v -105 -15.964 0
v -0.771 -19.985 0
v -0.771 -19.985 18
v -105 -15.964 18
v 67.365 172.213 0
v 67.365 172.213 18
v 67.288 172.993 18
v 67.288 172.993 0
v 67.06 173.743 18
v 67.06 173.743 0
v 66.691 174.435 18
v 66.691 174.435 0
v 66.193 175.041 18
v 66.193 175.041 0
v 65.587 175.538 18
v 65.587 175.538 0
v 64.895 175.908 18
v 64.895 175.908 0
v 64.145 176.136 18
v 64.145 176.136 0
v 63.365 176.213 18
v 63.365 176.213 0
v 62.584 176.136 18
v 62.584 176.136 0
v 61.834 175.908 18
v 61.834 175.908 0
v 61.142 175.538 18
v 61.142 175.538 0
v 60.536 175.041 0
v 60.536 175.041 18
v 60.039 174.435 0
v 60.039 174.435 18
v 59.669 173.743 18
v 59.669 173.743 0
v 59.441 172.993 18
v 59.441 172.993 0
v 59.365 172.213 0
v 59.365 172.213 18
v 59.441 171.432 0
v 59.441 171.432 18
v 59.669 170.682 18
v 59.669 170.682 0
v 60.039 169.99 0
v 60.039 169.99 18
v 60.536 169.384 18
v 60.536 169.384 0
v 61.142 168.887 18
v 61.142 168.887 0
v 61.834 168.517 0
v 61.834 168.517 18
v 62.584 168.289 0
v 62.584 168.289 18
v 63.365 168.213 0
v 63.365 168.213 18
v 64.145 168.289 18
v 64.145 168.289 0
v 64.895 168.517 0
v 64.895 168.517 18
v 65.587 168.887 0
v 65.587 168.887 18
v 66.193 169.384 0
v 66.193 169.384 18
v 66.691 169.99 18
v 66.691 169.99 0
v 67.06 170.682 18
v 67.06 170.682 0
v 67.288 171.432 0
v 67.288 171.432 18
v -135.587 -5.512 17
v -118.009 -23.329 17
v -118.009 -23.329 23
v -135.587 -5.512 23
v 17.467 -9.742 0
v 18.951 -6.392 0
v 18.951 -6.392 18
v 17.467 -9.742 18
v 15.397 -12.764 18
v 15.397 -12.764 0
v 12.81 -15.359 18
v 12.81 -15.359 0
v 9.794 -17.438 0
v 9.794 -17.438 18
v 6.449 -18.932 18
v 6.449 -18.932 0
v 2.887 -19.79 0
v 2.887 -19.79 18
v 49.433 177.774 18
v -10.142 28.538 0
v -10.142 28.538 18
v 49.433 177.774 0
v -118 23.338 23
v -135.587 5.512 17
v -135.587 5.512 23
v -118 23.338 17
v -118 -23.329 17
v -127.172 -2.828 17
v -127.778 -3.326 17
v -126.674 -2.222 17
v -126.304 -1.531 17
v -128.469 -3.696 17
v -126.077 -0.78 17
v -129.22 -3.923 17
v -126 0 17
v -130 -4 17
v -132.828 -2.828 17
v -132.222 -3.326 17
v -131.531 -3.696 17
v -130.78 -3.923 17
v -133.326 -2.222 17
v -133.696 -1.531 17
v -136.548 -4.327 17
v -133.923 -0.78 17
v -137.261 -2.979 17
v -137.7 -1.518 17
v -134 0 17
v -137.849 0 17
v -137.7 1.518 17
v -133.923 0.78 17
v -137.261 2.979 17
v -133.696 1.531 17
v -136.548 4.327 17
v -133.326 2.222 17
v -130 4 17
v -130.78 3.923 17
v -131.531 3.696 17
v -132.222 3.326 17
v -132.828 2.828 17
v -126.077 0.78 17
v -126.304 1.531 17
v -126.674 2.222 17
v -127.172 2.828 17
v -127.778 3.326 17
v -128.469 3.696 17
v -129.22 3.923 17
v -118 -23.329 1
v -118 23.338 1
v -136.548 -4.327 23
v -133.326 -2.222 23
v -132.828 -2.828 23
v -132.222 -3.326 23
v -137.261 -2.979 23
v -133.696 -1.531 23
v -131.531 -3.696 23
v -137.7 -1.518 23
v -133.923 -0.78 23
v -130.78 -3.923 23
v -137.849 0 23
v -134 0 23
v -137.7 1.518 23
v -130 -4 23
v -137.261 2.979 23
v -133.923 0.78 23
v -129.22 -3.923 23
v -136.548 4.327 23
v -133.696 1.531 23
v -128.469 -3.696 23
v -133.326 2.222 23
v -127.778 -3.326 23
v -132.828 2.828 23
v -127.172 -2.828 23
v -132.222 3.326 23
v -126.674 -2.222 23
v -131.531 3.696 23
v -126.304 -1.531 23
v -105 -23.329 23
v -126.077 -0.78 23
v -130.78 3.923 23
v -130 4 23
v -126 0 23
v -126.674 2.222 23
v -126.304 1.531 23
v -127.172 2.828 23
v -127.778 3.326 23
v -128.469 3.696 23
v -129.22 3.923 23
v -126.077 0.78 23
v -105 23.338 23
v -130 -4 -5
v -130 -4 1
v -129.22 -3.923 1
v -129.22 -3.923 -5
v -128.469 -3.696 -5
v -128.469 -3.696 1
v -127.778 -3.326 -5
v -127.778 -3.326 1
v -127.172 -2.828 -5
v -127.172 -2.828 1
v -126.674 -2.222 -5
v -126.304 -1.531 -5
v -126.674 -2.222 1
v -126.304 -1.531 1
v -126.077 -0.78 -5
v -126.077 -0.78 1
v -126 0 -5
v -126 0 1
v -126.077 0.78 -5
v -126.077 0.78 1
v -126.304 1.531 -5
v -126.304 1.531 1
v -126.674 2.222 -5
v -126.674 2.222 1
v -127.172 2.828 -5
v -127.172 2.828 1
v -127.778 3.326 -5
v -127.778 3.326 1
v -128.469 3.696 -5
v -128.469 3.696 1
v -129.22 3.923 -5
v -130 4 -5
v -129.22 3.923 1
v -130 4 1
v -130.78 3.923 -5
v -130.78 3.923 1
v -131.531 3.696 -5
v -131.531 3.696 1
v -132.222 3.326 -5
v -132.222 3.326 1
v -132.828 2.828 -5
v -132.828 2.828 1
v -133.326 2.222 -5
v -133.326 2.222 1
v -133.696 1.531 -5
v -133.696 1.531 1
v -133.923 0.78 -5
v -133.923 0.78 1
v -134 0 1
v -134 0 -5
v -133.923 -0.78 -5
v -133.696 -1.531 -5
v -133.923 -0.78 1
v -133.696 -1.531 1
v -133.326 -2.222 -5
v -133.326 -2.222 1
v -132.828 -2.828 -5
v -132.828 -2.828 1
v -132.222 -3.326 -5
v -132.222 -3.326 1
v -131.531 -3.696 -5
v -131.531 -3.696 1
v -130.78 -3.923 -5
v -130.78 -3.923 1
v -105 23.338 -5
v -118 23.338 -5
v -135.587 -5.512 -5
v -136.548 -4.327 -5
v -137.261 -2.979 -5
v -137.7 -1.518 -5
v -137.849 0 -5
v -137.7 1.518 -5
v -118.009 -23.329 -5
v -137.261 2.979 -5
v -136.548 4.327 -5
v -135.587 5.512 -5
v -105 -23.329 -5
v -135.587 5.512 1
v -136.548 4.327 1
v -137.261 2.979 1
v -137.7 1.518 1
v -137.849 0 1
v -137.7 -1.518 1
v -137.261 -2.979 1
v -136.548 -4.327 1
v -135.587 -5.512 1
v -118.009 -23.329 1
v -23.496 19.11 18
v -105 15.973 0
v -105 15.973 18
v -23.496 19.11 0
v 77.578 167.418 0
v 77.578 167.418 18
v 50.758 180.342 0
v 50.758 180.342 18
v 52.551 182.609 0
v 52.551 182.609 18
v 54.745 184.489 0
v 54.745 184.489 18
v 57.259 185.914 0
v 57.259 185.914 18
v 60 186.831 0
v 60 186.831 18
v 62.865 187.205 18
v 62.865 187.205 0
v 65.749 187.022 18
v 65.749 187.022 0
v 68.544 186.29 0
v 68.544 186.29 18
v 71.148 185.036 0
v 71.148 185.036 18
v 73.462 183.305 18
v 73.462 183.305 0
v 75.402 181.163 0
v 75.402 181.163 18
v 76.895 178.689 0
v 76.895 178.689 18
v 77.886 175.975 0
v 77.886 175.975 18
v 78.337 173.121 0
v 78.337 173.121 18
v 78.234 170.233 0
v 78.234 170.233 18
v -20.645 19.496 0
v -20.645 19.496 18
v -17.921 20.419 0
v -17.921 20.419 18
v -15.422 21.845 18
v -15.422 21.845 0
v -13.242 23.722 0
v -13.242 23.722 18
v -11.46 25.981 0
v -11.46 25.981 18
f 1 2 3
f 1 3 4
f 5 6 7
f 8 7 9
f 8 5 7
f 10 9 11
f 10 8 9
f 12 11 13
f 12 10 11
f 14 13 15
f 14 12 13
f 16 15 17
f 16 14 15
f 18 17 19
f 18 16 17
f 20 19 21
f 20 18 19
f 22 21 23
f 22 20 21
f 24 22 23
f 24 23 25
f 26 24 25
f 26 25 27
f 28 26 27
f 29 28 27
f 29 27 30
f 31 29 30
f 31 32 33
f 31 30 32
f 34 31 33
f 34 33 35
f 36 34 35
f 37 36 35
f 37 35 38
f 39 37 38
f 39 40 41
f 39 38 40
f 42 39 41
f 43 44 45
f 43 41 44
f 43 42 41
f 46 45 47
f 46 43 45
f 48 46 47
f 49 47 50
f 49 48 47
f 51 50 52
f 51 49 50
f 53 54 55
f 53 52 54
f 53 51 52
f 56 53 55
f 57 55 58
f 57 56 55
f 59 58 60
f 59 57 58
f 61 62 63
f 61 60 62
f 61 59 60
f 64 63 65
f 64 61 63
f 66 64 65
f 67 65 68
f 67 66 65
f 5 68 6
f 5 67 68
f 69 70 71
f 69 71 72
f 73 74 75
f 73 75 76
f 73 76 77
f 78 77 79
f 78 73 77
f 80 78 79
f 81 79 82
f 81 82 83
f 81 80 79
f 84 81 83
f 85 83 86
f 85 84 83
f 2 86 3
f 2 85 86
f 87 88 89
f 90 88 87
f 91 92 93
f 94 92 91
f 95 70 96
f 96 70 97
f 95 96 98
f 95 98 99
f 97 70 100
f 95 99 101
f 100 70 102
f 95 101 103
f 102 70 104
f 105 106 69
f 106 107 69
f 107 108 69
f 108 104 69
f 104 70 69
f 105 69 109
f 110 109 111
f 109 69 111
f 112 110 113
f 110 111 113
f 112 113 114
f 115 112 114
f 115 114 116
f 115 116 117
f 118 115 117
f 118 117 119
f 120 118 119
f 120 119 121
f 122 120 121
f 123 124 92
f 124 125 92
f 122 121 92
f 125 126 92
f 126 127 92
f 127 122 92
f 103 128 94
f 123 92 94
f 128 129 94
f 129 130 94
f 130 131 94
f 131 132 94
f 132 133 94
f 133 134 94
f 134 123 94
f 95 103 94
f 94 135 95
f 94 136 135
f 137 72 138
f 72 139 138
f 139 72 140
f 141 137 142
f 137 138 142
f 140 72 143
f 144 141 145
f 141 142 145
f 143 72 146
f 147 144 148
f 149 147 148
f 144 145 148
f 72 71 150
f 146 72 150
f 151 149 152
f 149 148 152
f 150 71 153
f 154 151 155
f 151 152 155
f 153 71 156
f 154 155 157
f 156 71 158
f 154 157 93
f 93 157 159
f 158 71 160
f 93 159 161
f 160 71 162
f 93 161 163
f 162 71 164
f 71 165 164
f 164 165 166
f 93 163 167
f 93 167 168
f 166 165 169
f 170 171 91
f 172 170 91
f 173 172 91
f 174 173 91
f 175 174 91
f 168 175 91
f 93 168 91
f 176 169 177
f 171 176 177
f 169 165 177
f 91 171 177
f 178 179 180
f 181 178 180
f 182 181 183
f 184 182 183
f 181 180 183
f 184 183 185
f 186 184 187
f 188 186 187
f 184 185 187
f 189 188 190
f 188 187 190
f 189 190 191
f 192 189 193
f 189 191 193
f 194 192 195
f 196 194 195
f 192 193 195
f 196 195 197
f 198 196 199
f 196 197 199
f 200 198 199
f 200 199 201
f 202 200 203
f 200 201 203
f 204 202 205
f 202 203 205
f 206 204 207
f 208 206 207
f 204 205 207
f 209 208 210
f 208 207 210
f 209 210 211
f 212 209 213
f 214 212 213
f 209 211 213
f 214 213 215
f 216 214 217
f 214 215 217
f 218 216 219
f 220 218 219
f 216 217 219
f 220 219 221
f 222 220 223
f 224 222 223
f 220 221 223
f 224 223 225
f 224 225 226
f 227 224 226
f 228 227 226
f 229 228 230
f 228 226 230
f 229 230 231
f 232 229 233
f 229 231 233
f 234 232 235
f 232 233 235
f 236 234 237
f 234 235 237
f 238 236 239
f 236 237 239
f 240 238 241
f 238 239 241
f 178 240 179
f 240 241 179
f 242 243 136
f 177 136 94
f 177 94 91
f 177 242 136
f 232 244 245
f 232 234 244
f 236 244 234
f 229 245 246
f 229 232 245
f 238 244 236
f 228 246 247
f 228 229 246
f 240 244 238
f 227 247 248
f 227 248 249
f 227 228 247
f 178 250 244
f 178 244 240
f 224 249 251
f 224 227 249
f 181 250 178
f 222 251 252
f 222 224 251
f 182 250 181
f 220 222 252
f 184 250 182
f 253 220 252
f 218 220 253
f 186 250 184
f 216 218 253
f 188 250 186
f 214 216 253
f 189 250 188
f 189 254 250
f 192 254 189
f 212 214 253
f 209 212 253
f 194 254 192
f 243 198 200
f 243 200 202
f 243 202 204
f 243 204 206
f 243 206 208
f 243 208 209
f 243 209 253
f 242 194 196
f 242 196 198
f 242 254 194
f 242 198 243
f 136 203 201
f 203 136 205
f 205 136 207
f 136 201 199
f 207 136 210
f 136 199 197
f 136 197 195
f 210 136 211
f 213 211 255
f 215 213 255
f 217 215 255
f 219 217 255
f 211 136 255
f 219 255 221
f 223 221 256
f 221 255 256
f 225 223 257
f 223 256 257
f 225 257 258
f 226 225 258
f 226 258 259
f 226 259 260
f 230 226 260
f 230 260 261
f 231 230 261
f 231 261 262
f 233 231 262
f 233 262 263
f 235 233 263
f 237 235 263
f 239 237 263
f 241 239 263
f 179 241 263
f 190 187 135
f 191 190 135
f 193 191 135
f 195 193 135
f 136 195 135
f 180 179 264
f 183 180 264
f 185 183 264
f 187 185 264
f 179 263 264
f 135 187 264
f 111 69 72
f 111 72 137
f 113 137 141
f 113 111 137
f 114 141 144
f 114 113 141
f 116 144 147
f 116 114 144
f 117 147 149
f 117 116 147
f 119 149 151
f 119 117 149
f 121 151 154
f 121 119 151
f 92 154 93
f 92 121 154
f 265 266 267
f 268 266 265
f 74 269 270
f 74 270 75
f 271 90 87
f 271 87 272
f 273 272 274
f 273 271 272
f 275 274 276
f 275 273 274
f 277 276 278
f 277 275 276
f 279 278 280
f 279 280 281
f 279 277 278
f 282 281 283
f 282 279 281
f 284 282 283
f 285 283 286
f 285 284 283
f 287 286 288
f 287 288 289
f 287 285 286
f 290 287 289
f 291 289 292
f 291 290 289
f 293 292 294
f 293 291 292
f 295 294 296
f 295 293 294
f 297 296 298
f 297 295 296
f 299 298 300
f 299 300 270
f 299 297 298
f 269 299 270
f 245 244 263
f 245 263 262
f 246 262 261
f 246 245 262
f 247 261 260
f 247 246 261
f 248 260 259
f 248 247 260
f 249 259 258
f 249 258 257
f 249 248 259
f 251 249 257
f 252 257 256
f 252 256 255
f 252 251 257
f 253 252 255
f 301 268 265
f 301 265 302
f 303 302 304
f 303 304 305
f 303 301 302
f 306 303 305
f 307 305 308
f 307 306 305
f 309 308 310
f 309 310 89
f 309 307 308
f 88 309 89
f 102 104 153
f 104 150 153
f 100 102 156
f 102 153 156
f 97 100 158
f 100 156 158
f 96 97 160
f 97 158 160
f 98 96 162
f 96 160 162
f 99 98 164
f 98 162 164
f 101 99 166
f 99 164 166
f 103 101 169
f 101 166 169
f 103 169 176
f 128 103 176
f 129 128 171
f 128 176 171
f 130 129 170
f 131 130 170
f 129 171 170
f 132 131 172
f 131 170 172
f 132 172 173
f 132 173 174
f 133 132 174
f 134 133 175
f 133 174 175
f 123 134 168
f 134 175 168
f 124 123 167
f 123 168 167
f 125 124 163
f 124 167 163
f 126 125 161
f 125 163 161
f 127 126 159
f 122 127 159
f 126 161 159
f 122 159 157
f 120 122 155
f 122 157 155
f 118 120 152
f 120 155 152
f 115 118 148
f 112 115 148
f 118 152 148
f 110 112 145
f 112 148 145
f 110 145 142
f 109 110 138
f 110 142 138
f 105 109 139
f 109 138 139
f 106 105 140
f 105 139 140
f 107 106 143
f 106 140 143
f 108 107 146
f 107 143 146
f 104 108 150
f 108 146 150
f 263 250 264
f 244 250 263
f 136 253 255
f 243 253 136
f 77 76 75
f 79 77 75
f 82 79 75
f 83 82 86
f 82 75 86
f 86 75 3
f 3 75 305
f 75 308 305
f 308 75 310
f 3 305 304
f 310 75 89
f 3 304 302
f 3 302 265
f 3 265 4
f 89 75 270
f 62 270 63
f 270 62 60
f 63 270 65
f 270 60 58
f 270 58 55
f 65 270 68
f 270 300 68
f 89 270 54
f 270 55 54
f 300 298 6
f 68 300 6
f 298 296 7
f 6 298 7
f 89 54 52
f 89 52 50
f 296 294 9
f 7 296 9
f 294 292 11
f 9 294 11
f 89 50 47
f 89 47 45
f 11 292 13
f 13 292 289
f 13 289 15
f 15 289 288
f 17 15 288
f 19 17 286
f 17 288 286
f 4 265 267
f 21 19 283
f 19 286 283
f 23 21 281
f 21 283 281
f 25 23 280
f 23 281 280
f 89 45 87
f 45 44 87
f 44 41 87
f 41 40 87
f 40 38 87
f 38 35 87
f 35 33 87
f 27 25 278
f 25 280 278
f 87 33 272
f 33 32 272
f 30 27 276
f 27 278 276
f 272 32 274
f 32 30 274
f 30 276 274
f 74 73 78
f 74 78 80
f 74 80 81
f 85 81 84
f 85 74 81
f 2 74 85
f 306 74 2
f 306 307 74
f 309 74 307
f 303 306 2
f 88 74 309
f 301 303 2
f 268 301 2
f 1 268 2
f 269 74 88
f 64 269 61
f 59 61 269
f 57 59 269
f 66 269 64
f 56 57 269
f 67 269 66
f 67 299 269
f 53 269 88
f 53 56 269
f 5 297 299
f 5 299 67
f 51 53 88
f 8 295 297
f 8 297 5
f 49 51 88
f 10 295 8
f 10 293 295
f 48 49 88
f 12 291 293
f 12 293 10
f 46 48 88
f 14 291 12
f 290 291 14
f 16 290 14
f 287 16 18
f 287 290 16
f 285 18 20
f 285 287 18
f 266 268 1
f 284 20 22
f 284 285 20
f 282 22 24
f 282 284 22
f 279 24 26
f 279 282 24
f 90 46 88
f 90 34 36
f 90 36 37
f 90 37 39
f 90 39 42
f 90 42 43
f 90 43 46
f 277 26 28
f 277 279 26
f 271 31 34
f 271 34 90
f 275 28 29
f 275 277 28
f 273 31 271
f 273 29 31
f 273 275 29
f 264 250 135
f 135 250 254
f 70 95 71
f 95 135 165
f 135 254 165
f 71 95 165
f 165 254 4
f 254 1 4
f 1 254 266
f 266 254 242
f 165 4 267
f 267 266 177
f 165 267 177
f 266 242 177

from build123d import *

# Parameters (mm, degrees)
EXTRUDE_1_DEPTH      = 18
SKETCH_10_W          = 36.784417634
SKETCH_10_H          = 49.551694486
CUT_EXTRUDE_7_DEPTH  = 25
SKETCH_11_W          = 28
SKETCH_11_H          = 46.666666667
EXTRUDE_2_DEPTH      = 35
SKETCH_2_R           = 4
CUT_EXTRUDE_9_DEPTH  = 40
CUT_EXTRUDE_10_DEPTH = 22
CUT_EXTRUDE_11_DEPTH = 28


with BuildPart() as part:
    # 草图1 → 凸台-拉伸1 (new body)
    with BuildSketch(Plane.XY):
        with BuildLine():
            Line((-130.576922015, 14.988928879), (-23.496301019, 19.11044112))
            ThreePointArc((-23.496301019, 19.11044112), (-15.422230188, 21.845348847), (-10.142250191, 28.538042722))
            Line((-10.142250191, 28.538042722), (49.433348919, 177.774006572))
            ThreePointArc((49.433348919, 177.774006572), (68.544423032, 186.290222442), (77.578179631, 167.418276909))
            Line((77.578179631, 167.418276909), (18.950963208, -6.392260437))
            ThreePointArc((18.950963208, -6.392260437), (11.349883724, -16.46754807), (-0.770941638, -19.985135701))
            Line((-0.770941638, -19.985135701), (-130.000001063, -15.000027558))
            ThreePointArc((-130.000001063, -15.000027558), (-144.997253695, -0.28851385), (-130.576922015, 14.988928879))
        make_face()
    extrude(amount=EXTRUDE_1_DEPTH)

    # 草图10 → 切除-拉伸7 (cut, symmetric)
    with BuildSketch(Plane.ZY.offset(130)):
        Rectangle(SKETCH_10_W, SKETCH_10_H)
    extrude(amount=CUT_EXTRUDE_7_DEPTH, both=True, mode=Mode.SUBTRACT)

    # 草图11 → 凸台-拉伸2 (add)
    with BuildSketch(Plane.ZY.offset(105)):
        with Locations((9, 0.004479114)):
            Rectangle(SKETCH_11_W, SKETCH_11_H)
    extrude(amount=EXTRUDE_2_DEPTH)

    # 草图2 → 切除-拉伸9 (cut, symmetric)
    with BuildSketch(Plane.XY):
        with Locations((63.364635235, 172.212580846)):
            Circle(SKETCH_2_R)
        with Locations(Location((-130, 0, 0), (0, 0, 270))):
            Circle(SKETCH_2_R)
    extrude(amount=CUT_EXTRUDE_9_DEPTH, both=True, mode=Mode.SUBTRACT)

    # 草图16 → 切除-拉伸10 (cut)
    with BuildSketch(Plane.ZY.offset(140)):
        Polygon((1, 0), (1, -23.32885422), (17, -23.32885422), (17, 23.337812447), (1, 23.337812447), align=None)
    extrude(amount=-CUT_EXTRUDE_10_DEPTH, mode=Mode.SUBTRACT)

    # 草图17 → 切除-拉伸11 (cut)
    with BuildSketch(Plane(origin=(0, 0, -5), x_dir=(-1, 0, 0), z_dir=(0, 0, -1))):
        with BuildLine():
            Line((118, 23.337812447), (140, 23.337812447))
            Line((140, 23.337812447), (140, -23.32885422))
            Line((140, -23.32885422), (118, -23.337812447))
            Line((118, -23.337812447), (135.587008924, -5.512235317))
            ThreePointArc((135.587008924, -5.512235317), (137.848528965, 0), (135.587008924, 5.512235317))
            Line((135.587008924, 5.512235317), (118, 23.337812447))
        make_face()
    extrude(amount=-CUT_EXTRUDE_11_DEPTH, mode=Mode.SUBTRACT)


solid = part.part
